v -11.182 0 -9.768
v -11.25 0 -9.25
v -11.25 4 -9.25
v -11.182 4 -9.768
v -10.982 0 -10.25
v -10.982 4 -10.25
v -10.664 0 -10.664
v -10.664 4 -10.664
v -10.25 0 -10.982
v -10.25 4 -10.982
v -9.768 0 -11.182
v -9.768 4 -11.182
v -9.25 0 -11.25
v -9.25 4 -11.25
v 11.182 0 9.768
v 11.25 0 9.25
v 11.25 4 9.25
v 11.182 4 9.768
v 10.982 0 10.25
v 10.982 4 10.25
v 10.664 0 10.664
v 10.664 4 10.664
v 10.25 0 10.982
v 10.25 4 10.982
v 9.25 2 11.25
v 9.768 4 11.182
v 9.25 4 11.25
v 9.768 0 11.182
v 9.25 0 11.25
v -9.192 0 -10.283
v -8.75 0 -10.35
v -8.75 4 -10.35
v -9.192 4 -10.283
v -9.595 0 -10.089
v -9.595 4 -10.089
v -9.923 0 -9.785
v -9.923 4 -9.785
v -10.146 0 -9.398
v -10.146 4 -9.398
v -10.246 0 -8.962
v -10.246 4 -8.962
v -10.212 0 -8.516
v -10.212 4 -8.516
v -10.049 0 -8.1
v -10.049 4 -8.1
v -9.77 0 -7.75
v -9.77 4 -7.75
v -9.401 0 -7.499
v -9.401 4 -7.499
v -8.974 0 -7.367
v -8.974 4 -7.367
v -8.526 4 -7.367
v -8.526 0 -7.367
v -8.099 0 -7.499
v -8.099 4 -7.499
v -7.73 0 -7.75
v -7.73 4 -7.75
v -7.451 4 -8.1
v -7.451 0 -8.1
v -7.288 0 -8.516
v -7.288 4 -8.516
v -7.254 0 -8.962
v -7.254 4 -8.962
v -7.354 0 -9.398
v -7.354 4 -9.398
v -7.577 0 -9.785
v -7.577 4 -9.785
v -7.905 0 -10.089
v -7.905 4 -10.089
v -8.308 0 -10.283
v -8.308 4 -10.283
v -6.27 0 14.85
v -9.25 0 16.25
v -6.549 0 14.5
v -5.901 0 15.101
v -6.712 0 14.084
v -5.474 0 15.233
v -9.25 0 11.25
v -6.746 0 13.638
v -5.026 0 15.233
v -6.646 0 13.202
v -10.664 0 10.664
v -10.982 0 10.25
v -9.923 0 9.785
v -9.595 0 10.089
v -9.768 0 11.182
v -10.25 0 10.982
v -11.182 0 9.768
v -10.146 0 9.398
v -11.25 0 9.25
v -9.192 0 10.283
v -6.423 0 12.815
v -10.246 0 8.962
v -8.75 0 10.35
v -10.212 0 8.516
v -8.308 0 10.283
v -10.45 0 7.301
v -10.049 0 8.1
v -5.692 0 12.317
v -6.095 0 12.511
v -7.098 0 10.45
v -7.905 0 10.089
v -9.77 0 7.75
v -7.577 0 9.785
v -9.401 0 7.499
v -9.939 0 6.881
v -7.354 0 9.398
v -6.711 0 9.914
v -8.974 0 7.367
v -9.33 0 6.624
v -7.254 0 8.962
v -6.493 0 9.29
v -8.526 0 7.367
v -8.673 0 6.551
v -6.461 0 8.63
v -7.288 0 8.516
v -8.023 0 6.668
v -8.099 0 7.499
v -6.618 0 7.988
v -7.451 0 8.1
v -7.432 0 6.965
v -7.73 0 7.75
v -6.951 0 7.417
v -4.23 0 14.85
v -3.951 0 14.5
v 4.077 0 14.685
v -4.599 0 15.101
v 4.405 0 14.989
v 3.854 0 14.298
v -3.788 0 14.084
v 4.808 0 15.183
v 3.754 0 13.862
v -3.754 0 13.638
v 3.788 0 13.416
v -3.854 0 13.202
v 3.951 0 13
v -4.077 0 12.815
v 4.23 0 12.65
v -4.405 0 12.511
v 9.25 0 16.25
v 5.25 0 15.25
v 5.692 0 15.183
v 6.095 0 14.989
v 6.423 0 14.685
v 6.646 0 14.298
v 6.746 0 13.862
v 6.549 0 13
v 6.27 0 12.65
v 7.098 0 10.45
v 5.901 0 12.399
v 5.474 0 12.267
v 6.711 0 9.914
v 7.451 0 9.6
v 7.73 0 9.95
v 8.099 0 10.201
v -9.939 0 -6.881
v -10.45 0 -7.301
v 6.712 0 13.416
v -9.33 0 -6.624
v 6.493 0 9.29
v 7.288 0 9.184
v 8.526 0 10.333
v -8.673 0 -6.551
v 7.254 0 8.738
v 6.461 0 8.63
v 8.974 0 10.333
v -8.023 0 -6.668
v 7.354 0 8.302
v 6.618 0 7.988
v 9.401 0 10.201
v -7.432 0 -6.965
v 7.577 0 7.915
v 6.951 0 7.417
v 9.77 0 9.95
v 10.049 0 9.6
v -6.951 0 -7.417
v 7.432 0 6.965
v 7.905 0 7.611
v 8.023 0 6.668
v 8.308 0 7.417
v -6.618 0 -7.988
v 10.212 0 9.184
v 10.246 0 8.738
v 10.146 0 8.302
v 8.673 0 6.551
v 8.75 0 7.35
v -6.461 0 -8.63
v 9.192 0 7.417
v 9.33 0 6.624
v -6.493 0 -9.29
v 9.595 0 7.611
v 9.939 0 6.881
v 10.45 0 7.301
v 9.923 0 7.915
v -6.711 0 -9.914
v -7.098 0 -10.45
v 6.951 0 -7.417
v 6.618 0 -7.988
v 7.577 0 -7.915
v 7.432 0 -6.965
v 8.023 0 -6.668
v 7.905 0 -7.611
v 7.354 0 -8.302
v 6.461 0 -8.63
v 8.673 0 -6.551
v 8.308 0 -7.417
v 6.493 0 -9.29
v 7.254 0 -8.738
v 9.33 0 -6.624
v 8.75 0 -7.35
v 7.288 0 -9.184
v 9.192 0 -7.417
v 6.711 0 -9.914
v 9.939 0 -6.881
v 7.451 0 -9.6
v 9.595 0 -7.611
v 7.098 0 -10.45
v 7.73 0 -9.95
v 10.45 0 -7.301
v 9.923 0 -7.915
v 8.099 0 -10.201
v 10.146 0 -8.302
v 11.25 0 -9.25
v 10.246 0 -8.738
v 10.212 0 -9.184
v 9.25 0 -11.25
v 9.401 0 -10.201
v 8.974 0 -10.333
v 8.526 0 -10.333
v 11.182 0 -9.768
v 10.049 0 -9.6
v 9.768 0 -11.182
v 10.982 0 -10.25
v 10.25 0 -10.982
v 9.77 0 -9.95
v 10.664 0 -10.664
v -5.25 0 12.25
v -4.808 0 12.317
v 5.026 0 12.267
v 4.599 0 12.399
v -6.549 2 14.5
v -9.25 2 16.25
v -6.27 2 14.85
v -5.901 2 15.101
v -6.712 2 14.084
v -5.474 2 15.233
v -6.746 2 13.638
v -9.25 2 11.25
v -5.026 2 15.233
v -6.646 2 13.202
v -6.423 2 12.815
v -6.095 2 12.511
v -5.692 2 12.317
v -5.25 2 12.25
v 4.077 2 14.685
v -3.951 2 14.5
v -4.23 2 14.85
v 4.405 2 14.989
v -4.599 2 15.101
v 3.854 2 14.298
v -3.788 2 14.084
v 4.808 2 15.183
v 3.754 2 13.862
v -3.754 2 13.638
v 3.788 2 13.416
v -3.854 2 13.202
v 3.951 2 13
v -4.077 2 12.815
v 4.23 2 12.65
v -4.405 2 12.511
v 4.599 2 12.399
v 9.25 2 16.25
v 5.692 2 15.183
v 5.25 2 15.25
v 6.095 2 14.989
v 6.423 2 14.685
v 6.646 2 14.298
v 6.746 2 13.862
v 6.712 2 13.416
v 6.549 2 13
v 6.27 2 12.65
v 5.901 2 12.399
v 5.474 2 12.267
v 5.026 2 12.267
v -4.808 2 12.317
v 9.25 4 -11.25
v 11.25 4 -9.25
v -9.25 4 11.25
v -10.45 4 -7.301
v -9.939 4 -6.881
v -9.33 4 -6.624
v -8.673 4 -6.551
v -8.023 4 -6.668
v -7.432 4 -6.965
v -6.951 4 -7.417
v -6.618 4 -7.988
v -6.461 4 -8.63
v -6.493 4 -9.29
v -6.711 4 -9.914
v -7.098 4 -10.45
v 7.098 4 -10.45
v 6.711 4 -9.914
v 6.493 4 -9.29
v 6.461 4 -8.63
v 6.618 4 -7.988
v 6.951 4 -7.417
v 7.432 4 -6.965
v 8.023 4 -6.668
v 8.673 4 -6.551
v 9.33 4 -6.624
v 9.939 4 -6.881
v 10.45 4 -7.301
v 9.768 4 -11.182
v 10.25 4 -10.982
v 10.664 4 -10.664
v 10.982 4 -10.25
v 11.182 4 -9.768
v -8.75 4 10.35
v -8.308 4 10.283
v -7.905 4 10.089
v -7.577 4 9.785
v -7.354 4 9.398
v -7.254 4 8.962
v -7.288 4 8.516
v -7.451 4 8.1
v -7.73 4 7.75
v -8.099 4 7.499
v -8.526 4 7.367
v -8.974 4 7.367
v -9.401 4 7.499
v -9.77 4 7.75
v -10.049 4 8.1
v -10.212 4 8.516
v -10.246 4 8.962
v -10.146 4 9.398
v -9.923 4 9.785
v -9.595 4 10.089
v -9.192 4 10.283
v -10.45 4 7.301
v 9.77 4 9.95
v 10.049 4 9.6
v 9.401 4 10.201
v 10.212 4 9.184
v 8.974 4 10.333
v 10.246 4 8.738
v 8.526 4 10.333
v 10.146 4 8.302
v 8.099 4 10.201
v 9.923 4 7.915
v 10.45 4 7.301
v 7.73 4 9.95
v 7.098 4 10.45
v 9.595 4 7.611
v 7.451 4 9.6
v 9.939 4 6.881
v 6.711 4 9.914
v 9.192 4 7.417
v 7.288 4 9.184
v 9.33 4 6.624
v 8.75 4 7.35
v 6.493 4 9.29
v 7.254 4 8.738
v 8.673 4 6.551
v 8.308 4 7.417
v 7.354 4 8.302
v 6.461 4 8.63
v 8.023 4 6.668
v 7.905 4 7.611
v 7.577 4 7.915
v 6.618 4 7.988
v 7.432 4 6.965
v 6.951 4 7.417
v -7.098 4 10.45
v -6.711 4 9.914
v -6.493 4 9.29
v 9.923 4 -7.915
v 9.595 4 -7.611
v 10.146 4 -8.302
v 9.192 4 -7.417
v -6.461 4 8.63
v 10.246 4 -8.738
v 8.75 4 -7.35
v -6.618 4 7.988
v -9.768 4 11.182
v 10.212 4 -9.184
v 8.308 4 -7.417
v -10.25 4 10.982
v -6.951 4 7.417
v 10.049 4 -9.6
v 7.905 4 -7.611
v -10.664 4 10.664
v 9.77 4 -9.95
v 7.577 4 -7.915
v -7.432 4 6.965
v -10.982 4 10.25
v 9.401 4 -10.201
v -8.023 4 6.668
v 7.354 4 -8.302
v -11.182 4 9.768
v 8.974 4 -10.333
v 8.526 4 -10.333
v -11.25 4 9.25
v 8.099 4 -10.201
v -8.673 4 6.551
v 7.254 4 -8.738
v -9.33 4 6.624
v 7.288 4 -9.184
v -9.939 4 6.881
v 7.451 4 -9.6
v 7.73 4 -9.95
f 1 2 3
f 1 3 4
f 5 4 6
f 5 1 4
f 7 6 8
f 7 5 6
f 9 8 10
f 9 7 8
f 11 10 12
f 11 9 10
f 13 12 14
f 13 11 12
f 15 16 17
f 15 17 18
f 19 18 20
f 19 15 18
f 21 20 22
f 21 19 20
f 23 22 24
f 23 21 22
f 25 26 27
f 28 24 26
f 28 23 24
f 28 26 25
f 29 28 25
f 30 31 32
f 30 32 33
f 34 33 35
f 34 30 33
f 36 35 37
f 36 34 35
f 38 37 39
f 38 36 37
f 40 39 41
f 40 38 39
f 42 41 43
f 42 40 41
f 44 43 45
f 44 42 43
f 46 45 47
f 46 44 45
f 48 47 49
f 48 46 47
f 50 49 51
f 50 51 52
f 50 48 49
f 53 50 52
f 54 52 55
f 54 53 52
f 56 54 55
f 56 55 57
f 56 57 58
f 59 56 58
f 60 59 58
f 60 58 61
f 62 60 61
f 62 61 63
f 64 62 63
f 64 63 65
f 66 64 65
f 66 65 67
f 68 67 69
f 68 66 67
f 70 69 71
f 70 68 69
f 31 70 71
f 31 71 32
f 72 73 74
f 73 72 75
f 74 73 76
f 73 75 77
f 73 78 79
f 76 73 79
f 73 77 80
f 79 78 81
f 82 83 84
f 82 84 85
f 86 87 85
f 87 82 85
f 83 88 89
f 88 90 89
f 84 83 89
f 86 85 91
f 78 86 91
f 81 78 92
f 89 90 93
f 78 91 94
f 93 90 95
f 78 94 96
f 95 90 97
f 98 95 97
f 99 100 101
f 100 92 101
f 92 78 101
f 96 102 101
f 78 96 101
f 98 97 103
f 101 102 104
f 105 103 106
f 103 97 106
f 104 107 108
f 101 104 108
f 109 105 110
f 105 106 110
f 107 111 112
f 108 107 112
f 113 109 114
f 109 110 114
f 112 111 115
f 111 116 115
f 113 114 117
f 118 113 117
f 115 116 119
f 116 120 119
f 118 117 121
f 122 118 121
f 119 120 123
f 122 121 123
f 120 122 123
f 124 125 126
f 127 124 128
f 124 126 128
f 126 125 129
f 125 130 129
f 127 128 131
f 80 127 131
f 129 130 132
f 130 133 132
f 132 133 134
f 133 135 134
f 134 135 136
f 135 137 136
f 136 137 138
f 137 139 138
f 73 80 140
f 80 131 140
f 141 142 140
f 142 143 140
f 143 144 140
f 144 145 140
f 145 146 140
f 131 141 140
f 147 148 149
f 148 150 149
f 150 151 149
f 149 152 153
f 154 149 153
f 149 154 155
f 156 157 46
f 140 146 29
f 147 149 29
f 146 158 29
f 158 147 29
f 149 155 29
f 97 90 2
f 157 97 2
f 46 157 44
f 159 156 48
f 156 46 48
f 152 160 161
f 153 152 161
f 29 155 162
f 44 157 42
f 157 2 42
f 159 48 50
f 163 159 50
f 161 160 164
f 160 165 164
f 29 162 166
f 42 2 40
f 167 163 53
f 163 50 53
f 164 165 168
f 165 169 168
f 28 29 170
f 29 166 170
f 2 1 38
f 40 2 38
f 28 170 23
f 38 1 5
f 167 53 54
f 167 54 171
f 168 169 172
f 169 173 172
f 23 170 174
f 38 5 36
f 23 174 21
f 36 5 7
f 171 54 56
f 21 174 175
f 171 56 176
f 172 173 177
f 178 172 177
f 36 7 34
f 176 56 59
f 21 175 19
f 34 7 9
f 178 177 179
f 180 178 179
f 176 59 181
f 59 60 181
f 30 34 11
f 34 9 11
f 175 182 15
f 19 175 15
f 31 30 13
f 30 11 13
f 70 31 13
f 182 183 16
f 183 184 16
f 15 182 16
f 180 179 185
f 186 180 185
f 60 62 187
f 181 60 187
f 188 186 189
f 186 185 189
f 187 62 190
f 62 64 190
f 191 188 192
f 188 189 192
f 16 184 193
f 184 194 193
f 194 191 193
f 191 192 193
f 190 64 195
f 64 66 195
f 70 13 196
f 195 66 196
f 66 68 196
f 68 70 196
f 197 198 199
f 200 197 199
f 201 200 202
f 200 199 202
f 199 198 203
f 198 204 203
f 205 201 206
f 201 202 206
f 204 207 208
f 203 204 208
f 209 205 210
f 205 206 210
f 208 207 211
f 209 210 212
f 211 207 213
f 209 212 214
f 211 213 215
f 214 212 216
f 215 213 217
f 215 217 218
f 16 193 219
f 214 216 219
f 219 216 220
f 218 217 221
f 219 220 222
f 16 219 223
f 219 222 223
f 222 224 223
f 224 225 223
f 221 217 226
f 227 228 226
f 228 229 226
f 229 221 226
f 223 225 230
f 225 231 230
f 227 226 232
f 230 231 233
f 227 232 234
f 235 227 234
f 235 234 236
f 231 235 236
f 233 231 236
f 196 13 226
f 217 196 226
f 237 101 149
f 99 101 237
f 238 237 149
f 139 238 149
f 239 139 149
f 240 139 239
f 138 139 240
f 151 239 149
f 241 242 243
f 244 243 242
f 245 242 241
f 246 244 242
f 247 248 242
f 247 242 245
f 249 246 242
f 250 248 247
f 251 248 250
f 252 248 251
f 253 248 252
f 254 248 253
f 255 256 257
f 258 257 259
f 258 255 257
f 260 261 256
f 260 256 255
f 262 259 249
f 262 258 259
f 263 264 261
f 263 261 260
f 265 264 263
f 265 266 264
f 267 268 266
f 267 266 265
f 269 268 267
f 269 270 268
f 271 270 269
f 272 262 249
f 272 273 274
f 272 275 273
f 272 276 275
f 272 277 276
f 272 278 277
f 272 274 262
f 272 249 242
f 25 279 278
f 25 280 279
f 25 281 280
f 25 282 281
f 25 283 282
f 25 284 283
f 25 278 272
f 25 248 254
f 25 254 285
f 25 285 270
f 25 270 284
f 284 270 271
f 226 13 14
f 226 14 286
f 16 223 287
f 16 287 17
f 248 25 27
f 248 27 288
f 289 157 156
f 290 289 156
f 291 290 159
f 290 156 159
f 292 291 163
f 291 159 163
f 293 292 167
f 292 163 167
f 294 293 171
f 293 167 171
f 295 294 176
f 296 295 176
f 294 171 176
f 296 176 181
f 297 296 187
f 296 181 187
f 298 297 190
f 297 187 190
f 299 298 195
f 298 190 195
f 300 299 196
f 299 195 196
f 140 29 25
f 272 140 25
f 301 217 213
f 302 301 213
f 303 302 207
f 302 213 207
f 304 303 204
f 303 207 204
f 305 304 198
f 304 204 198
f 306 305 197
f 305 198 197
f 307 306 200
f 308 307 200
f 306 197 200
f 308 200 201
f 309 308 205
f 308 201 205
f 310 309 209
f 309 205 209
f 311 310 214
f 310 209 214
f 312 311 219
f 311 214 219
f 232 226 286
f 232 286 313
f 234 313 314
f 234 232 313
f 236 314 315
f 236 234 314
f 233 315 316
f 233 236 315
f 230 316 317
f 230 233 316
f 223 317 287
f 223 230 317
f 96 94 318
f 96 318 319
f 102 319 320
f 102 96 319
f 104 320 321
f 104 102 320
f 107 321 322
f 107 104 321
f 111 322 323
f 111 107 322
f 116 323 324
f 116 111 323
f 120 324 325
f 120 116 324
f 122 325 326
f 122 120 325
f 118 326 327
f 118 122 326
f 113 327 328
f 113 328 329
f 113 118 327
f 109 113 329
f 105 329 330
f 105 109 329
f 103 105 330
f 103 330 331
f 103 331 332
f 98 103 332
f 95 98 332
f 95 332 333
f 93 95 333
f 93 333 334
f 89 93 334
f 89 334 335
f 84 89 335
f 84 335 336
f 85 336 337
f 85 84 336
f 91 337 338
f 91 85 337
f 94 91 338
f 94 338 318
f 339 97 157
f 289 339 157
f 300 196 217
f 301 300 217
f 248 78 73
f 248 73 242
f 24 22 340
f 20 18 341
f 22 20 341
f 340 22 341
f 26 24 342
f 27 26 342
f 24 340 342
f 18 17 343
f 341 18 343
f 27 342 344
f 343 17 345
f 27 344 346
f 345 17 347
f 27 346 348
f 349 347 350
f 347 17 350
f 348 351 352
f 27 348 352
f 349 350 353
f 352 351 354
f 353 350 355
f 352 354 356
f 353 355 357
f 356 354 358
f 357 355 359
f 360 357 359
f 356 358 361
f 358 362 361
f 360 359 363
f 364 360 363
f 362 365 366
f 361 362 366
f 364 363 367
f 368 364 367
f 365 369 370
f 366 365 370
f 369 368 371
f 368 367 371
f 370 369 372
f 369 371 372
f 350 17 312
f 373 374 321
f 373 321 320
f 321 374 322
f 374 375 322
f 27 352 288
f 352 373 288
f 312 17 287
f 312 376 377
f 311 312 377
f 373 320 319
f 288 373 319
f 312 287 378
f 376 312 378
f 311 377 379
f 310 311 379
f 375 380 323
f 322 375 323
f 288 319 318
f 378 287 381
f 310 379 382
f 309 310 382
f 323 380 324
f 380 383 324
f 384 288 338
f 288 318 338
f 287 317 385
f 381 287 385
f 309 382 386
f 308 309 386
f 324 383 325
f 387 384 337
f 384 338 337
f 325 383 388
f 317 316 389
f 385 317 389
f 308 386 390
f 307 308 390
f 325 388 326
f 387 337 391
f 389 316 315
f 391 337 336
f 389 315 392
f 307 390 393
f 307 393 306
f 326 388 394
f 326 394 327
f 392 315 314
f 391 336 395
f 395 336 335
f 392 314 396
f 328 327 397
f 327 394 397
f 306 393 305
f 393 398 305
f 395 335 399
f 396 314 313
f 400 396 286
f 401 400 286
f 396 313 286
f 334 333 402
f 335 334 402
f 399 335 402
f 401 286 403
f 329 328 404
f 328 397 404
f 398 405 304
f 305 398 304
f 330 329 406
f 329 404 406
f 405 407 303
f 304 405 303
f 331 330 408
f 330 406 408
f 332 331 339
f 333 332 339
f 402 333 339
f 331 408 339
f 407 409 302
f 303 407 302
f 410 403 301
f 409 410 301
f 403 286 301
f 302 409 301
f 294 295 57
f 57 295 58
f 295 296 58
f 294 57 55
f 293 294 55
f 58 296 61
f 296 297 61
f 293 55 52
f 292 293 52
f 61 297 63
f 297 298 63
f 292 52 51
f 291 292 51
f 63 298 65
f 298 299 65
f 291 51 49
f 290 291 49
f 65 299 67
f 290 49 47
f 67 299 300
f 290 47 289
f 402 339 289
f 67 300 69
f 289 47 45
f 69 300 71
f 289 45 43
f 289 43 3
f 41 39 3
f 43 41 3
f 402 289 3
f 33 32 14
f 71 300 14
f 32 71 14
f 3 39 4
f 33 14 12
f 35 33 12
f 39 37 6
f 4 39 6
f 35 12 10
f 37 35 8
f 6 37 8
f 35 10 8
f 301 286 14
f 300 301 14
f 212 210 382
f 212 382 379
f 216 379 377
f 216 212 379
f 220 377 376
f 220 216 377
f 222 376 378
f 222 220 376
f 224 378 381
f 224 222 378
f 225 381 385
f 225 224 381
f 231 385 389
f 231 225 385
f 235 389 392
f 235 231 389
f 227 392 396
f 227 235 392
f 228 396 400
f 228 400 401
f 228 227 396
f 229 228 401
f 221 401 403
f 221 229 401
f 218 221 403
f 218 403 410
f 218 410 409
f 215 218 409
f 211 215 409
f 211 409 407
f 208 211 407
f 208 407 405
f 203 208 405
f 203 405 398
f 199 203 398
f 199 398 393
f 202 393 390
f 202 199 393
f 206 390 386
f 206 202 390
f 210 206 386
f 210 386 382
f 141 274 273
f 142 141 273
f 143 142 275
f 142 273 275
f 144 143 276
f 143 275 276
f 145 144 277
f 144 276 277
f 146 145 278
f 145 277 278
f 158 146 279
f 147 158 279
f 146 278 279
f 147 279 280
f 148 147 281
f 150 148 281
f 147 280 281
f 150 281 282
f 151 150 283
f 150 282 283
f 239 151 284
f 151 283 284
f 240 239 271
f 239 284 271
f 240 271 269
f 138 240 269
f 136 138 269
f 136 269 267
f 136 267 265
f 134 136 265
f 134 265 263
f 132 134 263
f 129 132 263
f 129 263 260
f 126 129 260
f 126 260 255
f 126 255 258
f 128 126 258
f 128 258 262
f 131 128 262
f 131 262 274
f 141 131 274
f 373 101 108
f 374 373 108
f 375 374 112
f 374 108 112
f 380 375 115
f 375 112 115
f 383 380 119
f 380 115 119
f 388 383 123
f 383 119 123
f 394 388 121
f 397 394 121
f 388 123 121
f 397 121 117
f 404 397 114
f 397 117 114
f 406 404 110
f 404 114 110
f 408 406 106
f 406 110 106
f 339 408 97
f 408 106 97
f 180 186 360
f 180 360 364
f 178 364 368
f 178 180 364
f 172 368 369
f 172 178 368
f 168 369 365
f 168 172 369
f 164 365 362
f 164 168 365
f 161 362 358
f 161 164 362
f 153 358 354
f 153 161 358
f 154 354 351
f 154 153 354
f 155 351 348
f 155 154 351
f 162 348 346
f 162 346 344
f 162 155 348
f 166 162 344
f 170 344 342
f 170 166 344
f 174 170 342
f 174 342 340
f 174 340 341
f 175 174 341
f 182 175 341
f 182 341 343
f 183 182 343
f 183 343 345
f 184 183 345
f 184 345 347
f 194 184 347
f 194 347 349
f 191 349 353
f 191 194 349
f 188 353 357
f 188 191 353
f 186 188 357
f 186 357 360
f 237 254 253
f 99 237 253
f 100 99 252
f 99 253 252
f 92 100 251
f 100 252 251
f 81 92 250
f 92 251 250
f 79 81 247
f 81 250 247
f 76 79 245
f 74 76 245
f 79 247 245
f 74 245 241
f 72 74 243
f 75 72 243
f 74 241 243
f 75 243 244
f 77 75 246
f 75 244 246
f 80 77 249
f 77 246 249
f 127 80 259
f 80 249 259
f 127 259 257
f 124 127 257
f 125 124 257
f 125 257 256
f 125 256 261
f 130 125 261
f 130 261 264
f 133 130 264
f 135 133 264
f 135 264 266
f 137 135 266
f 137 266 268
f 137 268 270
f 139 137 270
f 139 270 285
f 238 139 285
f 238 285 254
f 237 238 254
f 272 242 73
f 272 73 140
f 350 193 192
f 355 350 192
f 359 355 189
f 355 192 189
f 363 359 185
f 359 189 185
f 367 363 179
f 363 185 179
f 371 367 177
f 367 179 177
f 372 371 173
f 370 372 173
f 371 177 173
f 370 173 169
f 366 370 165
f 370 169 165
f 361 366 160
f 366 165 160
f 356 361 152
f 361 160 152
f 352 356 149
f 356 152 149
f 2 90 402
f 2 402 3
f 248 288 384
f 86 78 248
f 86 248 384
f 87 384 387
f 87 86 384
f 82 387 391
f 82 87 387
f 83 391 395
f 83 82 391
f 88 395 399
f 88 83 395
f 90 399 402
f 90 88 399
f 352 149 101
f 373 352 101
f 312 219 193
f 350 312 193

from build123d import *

# Parameters (mm, degrees)
SKETCH1_R           = 1.5
BOSS_EXTRUDE1_DEPTH = 4
SKETCH2_W           = 18.5
SKETCH2_H           = 2
BOSS_EXTRUDE2_DEPTH = 5
SKETCH3_R           = 1.5
CUT_EXTRUDE1_DEPTH  = 5


with BuildPart() as part:
    # Sketch1 → Boss-Extrude1 (new body)
    with BuildSketch(Plane(origin=(0, 0, 0), x_dir=(1, 0, 0), z_dir=(0, 1, 0))):
        with BuildLine():
            Line((-9.25, 11.25), (9.25, 11.25))
            ThreePointArc((9.25, 11.25), (10.664213562, 10.664213562), (11.25, 9.25))
            Line((11.25, 9.25), (11.25, -9.25))
            ThreePointArc((11.25, -9.25), (10.664213562, -10.664213562), (9.25, -11.25))
            Line((9.25, -11.25), (-9.25, -11.25))
            ThreePointArc((-9.25, -11.25), (-10.664213562, -10.664213562), (-11.25, -9.25))
            Line((-11.25, -9.25), (-11.25, 9.25))
            ThreePointArc((-11.25, 9.25), (-10.664213562, 10.664213562), (-9.25, 11.25))
        make_face()
        with Locations(Location((8.75, 8.85, 0), (0, 0, 270))):
            Circle(SKETCH1_R, mode=Mode.SUBTRACT)
        with Locations(Location((8.75, -8.85, 0), (0, 0, 90))):
            Circle(SKETCH1_R, mode=Mode.SUBTRACT)
        with Locations(Location((-8.75, 8.85, 0), (0, 0, 90))):
            Circle(SKETCH1_R, mode=Mode.SUBTRACT)
        with Locations(Location((-8.75, -8.85, 0), (0, 0, 270))):
            Circle(SKETCH1_R, mode=Mode.SUBTRACT)
        with BuildLine():
            Line((-7.097728836, 10.45), (7.097728836, 10.45))
            ThreePointArc((7.097728836, 10.45), (7.175222498, 7.173671924), (10.45, 7.300806662))
            Line((10.45, 7.300806662), (10.45, -7.300806662))
            ThreePointArc((10.45, -7.300806662), (7.175222498, -7.173671924), (7.097728836, -10.45))
            Line((7.097728836, -10.45), (-7.097728836, -10.45))
            ThreePointArc((-7.097728836, -10.45), (-7.175222498, -7.173671924), (-10.45, -7.300806662))
            Line((-10.45, -7.300806662), (-10.45, 7.300806662))
            ThreePointArc((-10.45, 7.300806662), (-7.175222498, 7.173671924), (-7.097728836, 10.45))
        make_face(mode=Mode.SUBTRACT)
    extrude(amount=BOSS_EXTRUDE1_DEPTH)

    # Sketch2 → Boss-Extrude2 (add)
    with BuildSketch(Plane.XY.offset(11.25)):
        with Locations((0, 1)):
            Rectangle(SKETCH2_W, SKETCH2_H)
    extrude(amount=BOSS_EXTRUDE2_DEPTH)

    # Sketch3 → Cut-Extrude1 (cut)
    with BuildSketch(Plane(origin=(0, 2, 0), x_dir=(1, 0, 0), z_dir=(0, 1, 0))):
        with Locations(Location((5.25, -13.75, 0), (0, 0, 270))):
            Circle(SKETCH3_R)
        with Locations(Location((-5.25, -13.75, 0), (0, 0, 90))):
            Circle(SKETCH3_R)
    extrude(amount=-CUT_EXTRUDE1_DEPTH, mode=Mode.SUBTRACT)


solid = part.part
